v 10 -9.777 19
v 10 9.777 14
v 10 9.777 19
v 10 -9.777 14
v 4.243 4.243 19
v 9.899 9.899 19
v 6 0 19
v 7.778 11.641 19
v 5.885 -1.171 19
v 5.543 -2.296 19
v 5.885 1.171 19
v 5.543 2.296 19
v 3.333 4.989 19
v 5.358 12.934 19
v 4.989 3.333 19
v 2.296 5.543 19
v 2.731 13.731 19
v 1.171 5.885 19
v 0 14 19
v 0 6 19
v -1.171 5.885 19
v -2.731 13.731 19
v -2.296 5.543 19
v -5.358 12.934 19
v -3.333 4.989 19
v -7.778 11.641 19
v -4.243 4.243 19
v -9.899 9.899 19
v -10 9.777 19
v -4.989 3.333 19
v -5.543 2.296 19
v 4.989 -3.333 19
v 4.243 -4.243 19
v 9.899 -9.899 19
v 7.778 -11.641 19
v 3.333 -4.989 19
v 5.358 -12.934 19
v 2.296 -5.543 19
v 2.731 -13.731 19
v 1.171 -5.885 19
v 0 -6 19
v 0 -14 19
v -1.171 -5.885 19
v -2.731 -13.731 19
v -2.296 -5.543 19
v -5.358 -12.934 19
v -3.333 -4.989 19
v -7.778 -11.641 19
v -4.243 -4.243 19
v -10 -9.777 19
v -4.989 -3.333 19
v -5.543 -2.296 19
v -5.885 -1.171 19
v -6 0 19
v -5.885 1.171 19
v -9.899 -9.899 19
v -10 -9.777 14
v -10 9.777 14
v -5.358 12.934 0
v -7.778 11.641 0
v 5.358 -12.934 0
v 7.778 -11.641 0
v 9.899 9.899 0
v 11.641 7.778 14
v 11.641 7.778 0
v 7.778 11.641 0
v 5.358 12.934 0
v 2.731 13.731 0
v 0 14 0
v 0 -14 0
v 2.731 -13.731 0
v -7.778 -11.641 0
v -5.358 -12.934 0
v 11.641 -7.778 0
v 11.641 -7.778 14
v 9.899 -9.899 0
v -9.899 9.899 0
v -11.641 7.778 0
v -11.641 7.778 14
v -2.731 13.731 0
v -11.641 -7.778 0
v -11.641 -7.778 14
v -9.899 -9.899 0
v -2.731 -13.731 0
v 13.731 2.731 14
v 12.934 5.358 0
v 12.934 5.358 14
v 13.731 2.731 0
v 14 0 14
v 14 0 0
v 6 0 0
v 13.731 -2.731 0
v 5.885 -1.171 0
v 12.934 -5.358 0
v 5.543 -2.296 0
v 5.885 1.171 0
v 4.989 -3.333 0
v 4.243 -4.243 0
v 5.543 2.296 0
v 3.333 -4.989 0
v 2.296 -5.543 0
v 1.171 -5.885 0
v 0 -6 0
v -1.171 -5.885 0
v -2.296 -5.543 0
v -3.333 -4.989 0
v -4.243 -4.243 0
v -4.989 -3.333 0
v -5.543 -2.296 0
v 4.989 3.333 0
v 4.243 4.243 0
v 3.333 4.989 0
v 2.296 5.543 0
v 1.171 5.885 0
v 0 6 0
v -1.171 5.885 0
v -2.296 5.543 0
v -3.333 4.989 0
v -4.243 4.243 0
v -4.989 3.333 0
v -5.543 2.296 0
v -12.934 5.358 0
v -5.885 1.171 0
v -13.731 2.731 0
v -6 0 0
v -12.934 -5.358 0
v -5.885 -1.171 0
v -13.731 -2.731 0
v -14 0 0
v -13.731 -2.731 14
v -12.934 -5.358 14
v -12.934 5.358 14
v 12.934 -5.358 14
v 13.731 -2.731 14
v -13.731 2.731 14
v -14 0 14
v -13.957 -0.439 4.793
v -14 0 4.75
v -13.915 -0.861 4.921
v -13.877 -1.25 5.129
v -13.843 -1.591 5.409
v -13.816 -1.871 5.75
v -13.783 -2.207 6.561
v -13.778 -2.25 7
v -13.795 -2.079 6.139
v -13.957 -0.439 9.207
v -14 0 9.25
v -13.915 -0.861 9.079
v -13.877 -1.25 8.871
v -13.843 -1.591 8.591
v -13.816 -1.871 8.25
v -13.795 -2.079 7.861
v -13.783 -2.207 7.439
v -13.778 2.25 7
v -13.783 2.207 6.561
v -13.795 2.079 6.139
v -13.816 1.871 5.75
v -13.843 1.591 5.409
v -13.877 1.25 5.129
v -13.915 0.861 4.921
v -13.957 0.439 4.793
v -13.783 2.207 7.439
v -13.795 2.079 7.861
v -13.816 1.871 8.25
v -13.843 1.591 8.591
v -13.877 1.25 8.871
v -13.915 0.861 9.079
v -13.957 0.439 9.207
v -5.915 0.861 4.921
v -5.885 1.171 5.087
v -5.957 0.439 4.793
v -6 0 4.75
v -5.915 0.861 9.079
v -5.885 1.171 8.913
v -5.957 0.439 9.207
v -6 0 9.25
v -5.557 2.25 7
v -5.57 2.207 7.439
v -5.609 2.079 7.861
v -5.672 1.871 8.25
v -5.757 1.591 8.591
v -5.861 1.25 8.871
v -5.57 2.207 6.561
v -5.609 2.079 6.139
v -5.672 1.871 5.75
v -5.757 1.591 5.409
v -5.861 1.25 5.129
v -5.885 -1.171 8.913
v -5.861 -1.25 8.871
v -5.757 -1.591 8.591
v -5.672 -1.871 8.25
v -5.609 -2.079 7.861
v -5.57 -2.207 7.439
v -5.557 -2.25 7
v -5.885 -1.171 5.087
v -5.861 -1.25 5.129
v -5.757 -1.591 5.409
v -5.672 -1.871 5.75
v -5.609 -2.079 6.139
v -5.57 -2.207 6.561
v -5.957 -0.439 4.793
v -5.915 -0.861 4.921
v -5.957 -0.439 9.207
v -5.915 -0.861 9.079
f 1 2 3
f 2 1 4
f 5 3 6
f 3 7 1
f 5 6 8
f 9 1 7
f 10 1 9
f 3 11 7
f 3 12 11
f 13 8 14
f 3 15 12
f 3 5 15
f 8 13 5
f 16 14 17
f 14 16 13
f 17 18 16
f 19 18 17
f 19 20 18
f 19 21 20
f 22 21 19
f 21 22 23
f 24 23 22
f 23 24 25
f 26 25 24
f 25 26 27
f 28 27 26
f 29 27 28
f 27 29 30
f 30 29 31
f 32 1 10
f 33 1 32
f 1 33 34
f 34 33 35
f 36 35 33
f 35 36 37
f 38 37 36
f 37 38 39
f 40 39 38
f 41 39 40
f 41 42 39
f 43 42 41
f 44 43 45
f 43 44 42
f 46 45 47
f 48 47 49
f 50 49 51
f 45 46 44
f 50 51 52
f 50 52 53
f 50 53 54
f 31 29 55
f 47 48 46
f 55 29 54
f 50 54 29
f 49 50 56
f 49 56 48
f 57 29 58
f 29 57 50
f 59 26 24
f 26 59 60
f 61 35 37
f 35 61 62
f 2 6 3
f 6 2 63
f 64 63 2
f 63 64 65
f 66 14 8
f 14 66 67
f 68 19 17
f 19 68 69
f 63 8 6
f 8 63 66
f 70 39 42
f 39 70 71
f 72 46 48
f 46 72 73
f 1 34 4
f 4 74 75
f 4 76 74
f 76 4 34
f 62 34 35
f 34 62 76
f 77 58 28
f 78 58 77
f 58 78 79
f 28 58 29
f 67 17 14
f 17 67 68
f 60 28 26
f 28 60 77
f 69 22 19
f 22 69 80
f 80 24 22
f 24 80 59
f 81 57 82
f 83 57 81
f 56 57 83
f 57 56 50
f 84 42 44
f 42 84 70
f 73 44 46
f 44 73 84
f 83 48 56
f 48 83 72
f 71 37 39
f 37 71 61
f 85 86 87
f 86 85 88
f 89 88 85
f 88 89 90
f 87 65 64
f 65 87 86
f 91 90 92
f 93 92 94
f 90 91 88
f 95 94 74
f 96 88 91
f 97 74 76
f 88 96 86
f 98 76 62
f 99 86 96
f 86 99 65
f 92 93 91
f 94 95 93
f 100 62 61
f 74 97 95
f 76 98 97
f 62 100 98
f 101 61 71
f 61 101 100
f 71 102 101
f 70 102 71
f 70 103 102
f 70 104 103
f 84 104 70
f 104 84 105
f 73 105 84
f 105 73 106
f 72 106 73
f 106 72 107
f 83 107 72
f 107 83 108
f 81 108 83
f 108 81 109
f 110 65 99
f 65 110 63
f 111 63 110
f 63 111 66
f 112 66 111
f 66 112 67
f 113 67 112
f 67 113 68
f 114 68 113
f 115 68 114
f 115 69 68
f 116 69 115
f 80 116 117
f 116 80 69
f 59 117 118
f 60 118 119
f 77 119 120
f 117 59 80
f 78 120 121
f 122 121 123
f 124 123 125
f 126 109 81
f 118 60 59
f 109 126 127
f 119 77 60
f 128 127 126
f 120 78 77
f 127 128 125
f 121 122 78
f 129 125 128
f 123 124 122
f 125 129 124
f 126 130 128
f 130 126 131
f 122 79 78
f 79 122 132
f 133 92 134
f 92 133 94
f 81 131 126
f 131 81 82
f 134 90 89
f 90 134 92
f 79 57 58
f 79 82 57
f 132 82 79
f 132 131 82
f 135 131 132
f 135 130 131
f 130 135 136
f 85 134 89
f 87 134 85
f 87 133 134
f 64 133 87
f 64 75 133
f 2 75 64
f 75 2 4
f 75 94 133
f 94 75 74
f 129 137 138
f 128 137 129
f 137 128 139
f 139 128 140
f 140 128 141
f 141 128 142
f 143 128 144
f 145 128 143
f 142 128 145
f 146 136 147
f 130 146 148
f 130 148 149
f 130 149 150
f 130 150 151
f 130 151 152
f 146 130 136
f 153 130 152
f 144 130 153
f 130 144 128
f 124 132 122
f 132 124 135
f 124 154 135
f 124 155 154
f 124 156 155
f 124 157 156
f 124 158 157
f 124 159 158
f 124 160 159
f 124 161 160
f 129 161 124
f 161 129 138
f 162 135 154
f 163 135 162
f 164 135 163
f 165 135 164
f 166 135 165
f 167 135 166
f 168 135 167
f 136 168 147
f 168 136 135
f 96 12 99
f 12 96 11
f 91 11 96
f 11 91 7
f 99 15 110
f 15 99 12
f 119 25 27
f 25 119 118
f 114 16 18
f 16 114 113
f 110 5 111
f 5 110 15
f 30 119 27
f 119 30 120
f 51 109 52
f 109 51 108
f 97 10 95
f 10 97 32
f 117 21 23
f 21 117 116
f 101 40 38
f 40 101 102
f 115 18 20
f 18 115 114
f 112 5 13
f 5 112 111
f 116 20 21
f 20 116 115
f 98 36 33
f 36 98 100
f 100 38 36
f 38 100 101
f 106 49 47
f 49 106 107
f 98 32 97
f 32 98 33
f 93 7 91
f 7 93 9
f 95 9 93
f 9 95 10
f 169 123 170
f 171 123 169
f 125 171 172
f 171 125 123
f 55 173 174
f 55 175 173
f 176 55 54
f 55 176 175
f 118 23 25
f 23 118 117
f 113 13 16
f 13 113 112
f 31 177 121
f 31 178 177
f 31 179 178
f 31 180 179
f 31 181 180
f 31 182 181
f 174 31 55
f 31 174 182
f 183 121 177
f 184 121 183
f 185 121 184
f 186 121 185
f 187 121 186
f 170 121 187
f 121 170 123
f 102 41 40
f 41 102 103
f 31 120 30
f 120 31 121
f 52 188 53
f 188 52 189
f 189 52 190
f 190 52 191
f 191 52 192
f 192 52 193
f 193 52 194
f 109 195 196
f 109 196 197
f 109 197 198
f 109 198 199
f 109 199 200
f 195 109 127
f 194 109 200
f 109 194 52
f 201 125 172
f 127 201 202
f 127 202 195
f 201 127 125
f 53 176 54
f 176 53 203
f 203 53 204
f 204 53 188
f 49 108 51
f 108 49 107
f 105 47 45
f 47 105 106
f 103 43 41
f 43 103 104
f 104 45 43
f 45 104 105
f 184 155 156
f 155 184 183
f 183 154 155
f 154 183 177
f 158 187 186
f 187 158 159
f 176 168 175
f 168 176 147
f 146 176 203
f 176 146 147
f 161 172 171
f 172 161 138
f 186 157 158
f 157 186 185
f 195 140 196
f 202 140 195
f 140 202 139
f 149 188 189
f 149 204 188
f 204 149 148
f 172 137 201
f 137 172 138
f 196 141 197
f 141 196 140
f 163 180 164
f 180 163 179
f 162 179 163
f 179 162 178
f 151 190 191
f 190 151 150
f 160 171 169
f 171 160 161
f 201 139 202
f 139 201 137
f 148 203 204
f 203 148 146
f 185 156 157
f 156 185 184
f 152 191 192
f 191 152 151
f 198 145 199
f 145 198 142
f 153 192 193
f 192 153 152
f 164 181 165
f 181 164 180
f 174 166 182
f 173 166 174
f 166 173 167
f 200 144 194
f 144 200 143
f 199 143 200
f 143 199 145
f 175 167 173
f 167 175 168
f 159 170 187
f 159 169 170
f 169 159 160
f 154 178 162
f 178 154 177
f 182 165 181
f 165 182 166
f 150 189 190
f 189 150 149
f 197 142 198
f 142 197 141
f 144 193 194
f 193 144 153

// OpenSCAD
$fn = 32;

// ----------------------------------------------------------------------
// Oldham coupling hub: 28 x 19 mm
// ----------------------------------------------------------------------

// --- parameters (mm) ---
flange_dia = 28;          // hub diameter
flange_len = 14;          // hub length
hub_bore = 12;            // shaft bore
key_w = 20;               // drive tongue width
tongue_h = 5;             // drive tongue height
set_d = 4.5;              // set screw tap hole

module hub() {
  cylinder(h = flange_len, d = flange_dia);
  /* tongue, clipped to the hub disc and sunk 1 mm into the face */
  intersection() {
    translate([-key_w / 2, -flange_dia / 2, flange_len - 1])
      cube([key_w, flange_dia, tongue_h + 1]);
    translate([0, 0, flange_len - 1]) cylinder(h = tongue_h + 1, d = flange_dia);
  }
}

difference() {
  hub();
  translate([0, 0, -1]) cylinder(h = flange_len + tongue_h + 2, d = hub_bore);
  translate([-flange_dia / 2 - 1, 0, flange_len * 0.5])
    rotate([0, 90, 0]) cylinder(h = flange_dia / 2 + 2, d = set_d);
}
